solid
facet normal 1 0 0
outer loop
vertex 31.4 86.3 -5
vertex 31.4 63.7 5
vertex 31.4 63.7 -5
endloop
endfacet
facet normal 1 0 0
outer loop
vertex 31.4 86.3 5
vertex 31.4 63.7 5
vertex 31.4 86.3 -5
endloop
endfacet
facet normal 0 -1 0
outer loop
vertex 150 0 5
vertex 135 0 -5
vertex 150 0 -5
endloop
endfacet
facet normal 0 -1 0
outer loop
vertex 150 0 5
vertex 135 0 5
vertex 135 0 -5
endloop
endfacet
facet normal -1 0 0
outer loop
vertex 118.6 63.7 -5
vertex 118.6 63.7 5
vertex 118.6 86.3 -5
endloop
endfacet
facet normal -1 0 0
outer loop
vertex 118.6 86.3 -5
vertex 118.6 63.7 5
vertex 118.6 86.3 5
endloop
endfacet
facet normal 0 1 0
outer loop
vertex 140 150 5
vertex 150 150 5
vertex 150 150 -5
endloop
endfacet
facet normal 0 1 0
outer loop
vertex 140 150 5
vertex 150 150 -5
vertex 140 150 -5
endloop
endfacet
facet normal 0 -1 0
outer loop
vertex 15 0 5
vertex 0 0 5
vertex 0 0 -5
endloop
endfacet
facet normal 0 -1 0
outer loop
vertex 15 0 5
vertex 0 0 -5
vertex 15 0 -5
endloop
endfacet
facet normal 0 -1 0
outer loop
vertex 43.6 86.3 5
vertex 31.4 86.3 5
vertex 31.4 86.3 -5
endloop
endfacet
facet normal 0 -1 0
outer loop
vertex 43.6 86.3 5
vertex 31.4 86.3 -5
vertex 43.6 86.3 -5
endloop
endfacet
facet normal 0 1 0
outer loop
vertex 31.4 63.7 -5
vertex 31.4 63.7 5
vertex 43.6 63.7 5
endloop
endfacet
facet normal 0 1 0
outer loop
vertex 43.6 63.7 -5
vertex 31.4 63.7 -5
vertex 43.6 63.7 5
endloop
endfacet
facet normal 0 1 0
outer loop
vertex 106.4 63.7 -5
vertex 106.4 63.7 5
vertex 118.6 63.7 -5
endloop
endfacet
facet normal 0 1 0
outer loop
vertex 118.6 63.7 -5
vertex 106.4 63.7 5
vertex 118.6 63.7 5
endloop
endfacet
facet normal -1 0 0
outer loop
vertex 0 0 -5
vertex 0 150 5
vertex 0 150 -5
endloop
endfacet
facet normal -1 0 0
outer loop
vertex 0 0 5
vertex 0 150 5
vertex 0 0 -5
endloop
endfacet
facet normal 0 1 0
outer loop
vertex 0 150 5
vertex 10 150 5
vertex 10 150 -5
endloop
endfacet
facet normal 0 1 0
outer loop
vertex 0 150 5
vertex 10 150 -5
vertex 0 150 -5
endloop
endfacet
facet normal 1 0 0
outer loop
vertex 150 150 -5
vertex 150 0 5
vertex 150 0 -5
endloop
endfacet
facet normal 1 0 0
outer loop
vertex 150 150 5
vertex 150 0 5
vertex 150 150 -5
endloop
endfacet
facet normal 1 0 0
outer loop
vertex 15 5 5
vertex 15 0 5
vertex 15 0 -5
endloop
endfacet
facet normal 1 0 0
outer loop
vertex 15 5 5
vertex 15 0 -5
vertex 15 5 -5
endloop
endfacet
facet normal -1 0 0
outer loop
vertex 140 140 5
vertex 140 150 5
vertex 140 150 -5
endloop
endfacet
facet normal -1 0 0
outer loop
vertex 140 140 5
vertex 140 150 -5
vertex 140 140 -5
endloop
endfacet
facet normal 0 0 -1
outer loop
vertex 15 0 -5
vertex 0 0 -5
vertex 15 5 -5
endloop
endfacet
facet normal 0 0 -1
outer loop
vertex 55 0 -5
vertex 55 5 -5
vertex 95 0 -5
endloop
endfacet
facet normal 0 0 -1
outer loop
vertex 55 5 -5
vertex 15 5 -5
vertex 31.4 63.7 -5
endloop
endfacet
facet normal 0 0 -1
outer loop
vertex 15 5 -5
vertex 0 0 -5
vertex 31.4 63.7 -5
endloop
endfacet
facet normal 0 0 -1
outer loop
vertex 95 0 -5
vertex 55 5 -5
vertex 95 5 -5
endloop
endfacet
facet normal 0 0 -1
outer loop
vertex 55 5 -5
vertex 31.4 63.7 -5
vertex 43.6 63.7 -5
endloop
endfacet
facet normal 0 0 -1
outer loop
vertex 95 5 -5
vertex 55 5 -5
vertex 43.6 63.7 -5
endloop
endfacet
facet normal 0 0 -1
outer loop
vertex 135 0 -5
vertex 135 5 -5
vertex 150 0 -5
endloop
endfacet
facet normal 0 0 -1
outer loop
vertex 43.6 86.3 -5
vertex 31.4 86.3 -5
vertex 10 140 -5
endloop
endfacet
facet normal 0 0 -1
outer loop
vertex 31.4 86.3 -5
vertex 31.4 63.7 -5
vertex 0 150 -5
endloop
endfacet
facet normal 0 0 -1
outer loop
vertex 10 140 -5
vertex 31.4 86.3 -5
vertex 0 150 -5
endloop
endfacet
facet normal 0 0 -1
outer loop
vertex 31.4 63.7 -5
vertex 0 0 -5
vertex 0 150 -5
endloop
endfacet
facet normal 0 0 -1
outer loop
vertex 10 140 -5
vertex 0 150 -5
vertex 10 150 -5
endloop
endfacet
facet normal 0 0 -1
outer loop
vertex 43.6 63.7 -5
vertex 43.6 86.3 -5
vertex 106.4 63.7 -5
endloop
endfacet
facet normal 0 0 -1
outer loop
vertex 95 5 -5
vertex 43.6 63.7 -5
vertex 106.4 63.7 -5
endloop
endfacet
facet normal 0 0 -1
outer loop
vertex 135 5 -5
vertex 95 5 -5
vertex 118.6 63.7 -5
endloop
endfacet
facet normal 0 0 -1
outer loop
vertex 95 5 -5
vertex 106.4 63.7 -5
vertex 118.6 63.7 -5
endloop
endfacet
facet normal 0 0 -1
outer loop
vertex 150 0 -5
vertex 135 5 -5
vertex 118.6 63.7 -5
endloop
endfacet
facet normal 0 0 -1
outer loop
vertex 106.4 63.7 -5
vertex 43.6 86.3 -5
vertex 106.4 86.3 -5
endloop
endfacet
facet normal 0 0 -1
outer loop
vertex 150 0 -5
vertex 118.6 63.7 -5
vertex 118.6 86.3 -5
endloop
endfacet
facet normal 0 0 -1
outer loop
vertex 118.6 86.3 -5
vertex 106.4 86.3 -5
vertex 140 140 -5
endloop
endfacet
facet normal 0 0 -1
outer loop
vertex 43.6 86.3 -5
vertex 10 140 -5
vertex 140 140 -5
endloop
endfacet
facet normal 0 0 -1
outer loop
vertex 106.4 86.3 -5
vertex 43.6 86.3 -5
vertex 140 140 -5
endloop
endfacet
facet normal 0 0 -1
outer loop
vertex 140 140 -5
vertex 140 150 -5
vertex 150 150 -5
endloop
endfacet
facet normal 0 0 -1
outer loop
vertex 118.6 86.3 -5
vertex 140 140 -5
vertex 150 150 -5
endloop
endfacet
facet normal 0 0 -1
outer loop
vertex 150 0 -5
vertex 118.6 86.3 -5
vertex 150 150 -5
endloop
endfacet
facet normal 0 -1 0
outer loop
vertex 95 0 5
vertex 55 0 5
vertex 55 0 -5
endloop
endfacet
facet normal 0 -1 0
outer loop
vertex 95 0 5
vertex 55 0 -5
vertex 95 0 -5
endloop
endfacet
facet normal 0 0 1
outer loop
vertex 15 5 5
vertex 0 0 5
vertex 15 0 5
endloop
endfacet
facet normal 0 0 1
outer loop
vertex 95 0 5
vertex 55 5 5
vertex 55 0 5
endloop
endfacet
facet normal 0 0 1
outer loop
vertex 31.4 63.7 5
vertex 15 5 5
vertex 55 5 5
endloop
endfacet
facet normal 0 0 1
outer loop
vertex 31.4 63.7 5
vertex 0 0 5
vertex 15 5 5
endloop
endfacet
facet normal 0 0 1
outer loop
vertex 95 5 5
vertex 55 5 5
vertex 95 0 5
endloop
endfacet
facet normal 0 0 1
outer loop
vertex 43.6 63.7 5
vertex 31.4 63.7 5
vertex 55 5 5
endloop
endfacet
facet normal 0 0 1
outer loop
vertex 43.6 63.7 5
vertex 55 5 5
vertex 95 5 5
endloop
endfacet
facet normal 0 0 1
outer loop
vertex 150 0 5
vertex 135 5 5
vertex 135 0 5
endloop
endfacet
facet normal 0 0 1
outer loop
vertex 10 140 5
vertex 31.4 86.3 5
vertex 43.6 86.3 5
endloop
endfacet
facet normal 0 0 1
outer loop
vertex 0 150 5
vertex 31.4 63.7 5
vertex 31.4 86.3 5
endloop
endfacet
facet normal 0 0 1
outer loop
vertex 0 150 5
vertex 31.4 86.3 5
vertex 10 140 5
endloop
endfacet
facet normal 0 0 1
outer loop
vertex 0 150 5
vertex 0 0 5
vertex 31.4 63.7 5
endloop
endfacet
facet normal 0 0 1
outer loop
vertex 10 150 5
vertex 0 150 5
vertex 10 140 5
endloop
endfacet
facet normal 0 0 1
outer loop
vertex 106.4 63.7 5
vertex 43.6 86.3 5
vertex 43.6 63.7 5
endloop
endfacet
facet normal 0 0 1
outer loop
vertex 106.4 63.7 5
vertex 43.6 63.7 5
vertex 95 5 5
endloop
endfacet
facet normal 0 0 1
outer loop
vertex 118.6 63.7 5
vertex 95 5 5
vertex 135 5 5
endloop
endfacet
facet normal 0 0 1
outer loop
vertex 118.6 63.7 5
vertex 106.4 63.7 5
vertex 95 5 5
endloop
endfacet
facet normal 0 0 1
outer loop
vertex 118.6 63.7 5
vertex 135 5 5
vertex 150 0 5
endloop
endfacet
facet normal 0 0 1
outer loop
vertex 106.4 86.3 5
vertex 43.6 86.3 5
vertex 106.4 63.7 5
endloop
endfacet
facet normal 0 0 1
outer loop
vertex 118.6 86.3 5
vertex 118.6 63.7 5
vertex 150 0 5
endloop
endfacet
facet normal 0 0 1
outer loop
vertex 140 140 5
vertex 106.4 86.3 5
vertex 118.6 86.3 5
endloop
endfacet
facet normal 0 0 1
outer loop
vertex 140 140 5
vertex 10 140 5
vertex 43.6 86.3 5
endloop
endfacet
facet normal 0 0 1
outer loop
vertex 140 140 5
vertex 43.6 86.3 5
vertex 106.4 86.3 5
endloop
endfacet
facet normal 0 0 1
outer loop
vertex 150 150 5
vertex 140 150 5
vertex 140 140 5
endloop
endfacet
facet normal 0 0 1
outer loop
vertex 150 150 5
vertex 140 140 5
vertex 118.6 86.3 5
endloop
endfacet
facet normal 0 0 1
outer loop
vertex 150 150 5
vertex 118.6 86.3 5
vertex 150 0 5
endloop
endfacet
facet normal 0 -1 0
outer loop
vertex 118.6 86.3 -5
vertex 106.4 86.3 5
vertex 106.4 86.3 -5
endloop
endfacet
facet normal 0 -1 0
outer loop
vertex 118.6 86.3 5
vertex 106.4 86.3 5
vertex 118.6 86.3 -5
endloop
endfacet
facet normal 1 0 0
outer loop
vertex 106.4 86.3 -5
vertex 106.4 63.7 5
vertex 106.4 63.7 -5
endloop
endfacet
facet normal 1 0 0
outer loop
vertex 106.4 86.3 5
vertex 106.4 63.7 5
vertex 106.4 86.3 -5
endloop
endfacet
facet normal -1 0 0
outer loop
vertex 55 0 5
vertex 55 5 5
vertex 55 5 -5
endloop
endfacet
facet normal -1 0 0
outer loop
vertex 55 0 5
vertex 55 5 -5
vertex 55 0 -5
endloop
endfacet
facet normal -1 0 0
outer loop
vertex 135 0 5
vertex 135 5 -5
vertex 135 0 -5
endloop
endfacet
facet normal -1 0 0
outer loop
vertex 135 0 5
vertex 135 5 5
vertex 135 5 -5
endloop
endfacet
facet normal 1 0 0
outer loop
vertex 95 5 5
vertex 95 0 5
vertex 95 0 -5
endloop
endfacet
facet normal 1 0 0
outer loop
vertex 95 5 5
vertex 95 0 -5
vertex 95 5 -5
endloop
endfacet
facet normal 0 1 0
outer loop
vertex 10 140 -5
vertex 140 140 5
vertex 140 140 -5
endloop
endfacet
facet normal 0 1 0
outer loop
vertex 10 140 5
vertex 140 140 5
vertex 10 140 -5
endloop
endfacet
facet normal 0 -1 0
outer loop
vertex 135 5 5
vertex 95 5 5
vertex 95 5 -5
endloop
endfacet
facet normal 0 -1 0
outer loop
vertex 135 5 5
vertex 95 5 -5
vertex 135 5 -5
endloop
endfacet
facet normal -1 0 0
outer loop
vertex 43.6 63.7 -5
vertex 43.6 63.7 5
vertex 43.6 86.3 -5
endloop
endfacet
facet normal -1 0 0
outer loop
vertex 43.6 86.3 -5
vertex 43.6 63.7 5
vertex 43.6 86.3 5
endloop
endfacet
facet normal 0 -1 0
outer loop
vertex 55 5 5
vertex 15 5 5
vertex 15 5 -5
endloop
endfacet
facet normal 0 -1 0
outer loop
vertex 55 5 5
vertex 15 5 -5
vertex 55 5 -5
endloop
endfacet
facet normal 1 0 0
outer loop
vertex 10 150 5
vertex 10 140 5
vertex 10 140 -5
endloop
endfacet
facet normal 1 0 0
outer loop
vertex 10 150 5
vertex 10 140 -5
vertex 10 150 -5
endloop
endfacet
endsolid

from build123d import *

# Parameters (mm, degrees)
PAD_DEPTH    = 5
SKETCH001_W  = 12.2
SKETCH001_H  = 22.6
POCKET_DEPTH = 10.001


with BuildPart() as part:
    # Sketch → Pad (new body, symmetric)
    with BuildSketch(Plane.XY):
        Polygon((150, 0), (150, 150), (140, 150), (140, 140), (10, 140), (10, 150), (0, 150), (0, 0), (15, 0), (15, 5), (55, 5), (55, 0), (95, 0), (95, 5), (135, 5), (135, 0), align=None)
    extrude(amount=PAD_DEPTH, both=True)

    # Sketch001 (on Face18 of Pad) → Pocket (cut, through all)
    with BuildSketch(Plane.XY.offset(5)):
        with Locations((37.5, 75)):
            Rectangle(SKETCH001_W, SKETCH001_H)
        with Locations((112.5, 75)):
            Rectangle(SKETCH001_W, SKETCH001_H)
    extrude(amount=-POCKET_DEPTH, mode=Mode.SUBTRACT)


solid = part.part
